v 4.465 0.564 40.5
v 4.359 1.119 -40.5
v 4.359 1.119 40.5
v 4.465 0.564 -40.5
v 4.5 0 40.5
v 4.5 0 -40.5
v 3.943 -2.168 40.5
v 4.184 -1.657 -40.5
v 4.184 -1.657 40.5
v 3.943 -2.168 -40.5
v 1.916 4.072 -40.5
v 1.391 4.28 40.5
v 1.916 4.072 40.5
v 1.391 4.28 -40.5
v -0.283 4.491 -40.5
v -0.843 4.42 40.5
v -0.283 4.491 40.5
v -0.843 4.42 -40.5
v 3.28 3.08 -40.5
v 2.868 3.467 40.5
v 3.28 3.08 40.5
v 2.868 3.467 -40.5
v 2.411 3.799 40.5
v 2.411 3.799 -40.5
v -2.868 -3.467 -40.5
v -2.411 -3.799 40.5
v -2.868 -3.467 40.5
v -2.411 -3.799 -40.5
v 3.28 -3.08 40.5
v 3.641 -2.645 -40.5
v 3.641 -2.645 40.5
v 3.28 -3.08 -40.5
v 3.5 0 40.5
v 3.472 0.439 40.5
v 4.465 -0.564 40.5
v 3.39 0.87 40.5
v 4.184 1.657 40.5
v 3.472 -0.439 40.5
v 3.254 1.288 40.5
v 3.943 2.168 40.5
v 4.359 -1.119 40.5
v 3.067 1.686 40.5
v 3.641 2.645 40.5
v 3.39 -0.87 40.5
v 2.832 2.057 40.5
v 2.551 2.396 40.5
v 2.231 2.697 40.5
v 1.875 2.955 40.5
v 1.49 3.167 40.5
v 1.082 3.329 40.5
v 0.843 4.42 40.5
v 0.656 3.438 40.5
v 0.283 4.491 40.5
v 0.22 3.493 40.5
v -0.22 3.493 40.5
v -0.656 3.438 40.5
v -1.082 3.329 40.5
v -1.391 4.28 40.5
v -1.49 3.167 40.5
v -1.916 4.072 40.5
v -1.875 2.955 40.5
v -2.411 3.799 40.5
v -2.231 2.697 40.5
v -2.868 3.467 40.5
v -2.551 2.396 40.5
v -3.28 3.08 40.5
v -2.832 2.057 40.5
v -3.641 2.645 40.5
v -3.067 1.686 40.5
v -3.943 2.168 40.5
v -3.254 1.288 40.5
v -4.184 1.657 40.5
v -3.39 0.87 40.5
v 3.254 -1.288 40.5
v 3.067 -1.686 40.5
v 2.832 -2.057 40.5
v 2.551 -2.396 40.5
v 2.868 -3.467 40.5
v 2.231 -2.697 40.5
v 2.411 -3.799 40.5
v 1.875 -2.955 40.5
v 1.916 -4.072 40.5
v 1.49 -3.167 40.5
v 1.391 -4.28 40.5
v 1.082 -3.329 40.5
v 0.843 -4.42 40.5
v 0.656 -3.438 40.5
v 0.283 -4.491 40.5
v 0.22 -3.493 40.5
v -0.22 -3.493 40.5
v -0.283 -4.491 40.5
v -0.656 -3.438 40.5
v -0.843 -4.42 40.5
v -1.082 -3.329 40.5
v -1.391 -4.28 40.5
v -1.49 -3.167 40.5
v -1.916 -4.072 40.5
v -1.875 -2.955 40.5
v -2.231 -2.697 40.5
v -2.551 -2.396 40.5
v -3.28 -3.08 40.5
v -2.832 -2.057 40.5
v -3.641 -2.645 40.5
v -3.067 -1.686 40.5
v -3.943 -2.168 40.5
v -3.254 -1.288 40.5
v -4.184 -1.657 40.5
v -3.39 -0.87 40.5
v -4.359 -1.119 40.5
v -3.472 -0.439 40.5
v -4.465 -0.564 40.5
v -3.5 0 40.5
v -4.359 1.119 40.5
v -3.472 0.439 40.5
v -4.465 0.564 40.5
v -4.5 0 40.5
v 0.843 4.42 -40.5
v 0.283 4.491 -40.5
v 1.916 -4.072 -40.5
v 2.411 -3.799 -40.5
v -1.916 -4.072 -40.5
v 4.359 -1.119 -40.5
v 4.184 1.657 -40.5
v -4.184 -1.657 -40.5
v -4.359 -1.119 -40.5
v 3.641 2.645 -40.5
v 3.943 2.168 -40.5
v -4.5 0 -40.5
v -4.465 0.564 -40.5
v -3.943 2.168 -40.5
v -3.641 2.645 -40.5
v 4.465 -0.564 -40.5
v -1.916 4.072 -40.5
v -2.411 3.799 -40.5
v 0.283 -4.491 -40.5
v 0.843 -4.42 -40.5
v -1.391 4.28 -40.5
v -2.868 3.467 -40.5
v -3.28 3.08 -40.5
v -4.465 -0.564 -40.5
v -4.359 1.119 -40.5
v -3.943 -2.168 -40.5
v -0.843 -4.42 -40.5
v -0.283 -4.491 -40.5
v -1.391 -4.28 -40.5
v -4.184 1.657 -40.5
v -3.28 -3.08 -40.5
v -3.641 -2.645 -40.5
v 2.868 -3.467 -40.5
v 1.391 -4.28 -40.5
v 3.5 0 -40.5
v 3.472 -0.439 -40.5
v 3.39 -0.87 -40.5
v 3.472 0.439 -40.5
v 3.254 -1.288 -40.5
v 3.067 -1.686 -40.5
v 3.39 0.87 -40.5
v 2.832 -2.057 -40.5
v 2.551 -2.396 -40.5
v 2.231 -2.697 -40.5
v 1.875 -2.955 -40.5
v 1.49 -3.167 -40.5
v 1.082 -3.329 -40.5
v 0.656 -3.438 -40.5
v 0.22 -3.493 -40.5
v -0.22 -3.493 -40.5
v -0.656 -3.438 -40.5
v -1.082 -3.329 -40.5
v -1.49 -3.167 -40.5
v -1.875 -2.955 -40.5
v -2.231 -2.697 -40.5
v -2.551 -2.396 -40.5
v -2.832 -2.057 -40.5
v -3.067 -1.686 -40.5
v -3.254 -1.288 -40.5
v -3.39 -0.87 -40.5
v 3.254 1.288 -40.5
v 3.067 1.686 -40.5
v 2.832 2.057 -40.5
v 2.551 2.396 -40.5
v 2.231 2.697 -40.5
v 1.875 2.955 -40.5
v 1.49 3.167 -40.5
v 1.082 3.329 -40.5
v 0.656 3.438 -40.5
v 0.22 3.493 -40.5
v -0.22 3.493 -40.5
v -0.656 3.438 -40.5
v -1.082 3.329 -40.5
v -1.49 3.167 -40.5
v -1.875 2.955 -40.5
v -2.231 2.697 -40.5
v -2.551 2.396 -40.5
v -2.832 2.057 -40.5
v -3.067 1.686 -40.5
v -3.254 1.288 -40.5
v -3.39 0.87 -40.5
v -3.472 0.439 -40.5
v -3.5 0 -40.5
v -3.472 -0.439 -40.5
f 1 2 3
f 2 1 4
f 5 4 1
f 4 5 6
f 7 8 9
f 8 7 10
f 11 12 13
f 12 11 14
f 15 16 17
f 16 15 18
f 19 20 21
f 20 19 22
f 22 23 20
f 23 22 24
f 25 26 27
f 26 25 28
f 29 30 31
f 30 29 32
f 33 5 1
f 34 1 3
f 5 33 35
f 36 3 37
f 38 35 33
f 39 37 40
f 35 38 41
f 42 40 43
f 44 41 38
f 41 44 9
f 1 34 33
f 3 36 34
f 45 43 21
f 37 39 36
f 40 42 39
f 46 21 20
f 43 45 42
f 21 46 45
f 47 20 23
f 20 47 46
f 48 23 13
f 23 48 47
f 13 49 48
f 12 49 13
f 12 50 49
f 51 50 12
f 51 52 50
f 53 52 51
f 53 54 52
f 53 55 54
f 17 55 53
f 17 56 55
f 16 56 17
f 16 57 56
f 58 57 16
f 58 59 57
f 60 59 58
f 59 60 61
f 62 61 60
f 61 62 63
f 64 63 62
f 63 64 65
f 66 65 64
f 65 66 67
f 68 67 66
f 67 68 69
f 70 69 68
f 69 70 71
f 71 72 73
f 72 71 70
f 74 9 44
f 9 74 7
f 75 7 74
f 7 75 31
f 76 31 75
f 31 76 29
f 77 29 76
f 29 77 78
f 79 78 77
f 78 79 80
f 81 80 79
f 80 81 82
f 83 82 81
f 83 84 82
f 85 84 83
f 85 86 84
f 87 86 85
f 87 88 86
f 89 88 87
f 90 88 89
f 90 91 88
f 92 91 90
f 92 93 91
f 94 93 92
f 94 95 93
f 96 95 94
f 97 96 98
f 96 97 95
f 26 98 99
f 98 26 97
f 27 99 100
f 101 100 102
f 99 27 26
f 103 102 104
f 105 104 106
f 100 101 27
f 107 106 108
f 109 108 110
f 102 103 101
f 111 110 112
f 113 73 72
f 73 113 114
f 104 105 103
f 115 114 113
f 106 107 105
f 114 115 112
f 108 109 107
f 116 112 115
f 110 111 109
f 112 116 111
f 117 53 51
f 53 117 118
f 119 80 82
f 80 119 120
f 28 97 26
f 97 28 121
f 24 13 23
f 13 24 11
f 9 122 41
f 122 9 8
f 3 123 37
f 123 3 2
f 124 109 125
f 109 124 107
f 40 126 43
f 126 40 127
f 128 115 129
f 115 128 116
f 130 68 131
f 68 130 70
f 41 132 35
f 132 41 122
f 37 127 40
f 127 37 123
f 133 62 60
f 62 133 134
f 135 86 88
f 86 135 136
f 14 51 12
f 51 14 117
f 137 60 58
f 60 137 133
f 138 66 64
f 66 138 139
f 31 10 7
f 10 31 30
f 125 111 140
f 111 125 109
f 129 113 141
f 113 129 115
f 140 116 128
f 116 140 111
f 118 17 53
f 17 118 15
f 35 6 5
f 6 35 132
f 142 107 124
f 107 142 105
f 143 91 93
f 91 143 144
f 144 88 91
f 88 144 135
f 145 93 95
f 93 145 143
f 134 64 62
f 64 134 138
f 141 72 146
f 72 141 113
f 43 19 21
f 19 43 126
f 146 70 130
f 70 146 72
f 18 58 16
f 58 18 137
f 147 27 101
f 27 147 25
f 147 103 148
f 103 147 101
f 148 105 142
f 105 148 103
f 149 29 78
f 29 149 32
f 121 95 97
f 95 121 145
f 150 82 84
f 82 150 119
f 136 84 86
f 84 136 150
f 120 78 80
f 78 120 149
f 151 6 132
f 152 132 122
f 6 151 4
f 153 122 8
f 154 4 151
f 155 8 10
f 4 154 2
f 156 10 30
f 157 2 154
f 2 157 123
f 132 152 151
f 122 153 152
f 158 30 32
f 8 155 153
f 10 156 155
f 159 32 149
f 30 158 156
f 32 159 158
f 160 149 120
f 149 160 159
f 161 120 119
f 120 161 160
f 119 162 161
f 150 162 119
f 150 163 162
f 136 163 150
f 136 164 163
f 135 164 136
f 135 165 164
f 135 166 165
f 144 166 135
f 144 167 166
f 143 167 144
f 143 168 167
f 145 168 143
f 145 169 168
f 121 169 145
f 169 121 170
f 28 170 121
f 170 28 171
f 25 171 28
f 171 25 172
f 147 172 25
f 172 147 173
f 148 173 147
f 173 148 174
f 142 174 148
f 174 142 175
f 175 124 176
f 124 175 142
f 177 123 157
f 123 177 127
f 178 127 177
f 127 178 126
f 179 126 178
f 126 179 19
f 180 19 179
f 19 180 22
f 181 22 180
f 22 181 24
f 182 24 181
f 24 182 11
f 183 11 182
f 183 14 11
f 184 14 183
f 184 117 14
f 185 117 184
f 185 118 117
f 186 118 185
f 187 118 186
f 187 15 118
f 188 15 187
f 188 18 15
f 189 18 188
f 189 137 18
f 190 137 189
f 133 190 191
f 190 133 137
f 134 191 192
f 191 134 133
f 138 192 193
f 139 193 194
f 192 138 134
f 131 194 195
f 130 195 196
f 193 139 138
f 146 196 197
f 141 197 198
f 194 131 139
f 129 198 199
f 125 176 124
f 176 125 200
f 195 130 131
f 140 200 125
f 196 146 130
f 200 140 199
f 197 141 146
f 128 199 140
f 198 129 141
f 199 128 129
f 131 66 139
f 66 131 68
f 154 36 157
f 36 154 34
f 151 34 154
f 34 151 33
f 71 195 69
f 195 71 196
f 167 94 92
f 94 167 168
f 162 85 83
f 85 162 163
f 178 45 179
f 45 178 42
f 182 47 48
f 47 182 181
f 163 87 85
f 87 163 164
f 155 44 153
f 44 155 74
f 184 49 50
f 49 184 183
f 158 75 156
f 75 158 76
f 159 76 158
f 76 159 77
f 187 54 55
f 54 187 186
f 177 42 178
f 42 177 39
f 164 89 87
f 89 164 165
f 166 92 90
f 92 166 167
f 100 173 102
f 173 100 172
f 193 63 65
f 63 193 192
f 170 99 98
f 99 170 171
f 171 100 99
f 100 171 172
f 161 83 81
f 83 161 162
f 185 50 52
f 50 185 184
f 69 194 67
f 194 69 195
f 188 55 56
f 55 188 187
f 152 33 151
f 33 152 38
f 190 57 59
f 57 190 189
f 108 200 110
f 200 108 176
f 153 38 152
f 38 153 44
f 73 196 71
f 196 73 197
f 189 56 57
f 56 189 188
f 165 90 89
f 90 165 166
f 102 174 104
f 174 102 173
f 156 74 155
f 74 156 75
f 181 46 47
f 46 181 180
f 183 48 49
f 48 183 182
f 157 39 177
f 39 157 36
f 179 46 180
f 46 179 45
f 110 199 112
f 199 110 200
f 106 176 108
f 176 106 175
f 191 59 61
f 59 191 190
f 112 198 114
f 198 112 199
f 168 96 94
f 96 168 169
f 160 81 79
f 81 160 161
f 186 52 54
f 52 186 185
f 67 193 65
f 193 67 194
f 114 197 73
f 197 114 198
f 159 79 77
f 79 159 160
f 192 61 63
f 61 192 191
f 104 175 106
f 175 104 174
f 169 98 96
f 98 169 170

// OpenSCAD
$fn = 50;


difference() {
	union() {
		translate(v = [0, 0, -40.5000000000]) {
			cylinder(h = 81, r = 4.5000000000);
		}
	}
	union() {
		translate(v = [0, 0, -100.0000000000]) {
			cylinder(h = 200, r = 3.5000000000);
		}
	}
}
